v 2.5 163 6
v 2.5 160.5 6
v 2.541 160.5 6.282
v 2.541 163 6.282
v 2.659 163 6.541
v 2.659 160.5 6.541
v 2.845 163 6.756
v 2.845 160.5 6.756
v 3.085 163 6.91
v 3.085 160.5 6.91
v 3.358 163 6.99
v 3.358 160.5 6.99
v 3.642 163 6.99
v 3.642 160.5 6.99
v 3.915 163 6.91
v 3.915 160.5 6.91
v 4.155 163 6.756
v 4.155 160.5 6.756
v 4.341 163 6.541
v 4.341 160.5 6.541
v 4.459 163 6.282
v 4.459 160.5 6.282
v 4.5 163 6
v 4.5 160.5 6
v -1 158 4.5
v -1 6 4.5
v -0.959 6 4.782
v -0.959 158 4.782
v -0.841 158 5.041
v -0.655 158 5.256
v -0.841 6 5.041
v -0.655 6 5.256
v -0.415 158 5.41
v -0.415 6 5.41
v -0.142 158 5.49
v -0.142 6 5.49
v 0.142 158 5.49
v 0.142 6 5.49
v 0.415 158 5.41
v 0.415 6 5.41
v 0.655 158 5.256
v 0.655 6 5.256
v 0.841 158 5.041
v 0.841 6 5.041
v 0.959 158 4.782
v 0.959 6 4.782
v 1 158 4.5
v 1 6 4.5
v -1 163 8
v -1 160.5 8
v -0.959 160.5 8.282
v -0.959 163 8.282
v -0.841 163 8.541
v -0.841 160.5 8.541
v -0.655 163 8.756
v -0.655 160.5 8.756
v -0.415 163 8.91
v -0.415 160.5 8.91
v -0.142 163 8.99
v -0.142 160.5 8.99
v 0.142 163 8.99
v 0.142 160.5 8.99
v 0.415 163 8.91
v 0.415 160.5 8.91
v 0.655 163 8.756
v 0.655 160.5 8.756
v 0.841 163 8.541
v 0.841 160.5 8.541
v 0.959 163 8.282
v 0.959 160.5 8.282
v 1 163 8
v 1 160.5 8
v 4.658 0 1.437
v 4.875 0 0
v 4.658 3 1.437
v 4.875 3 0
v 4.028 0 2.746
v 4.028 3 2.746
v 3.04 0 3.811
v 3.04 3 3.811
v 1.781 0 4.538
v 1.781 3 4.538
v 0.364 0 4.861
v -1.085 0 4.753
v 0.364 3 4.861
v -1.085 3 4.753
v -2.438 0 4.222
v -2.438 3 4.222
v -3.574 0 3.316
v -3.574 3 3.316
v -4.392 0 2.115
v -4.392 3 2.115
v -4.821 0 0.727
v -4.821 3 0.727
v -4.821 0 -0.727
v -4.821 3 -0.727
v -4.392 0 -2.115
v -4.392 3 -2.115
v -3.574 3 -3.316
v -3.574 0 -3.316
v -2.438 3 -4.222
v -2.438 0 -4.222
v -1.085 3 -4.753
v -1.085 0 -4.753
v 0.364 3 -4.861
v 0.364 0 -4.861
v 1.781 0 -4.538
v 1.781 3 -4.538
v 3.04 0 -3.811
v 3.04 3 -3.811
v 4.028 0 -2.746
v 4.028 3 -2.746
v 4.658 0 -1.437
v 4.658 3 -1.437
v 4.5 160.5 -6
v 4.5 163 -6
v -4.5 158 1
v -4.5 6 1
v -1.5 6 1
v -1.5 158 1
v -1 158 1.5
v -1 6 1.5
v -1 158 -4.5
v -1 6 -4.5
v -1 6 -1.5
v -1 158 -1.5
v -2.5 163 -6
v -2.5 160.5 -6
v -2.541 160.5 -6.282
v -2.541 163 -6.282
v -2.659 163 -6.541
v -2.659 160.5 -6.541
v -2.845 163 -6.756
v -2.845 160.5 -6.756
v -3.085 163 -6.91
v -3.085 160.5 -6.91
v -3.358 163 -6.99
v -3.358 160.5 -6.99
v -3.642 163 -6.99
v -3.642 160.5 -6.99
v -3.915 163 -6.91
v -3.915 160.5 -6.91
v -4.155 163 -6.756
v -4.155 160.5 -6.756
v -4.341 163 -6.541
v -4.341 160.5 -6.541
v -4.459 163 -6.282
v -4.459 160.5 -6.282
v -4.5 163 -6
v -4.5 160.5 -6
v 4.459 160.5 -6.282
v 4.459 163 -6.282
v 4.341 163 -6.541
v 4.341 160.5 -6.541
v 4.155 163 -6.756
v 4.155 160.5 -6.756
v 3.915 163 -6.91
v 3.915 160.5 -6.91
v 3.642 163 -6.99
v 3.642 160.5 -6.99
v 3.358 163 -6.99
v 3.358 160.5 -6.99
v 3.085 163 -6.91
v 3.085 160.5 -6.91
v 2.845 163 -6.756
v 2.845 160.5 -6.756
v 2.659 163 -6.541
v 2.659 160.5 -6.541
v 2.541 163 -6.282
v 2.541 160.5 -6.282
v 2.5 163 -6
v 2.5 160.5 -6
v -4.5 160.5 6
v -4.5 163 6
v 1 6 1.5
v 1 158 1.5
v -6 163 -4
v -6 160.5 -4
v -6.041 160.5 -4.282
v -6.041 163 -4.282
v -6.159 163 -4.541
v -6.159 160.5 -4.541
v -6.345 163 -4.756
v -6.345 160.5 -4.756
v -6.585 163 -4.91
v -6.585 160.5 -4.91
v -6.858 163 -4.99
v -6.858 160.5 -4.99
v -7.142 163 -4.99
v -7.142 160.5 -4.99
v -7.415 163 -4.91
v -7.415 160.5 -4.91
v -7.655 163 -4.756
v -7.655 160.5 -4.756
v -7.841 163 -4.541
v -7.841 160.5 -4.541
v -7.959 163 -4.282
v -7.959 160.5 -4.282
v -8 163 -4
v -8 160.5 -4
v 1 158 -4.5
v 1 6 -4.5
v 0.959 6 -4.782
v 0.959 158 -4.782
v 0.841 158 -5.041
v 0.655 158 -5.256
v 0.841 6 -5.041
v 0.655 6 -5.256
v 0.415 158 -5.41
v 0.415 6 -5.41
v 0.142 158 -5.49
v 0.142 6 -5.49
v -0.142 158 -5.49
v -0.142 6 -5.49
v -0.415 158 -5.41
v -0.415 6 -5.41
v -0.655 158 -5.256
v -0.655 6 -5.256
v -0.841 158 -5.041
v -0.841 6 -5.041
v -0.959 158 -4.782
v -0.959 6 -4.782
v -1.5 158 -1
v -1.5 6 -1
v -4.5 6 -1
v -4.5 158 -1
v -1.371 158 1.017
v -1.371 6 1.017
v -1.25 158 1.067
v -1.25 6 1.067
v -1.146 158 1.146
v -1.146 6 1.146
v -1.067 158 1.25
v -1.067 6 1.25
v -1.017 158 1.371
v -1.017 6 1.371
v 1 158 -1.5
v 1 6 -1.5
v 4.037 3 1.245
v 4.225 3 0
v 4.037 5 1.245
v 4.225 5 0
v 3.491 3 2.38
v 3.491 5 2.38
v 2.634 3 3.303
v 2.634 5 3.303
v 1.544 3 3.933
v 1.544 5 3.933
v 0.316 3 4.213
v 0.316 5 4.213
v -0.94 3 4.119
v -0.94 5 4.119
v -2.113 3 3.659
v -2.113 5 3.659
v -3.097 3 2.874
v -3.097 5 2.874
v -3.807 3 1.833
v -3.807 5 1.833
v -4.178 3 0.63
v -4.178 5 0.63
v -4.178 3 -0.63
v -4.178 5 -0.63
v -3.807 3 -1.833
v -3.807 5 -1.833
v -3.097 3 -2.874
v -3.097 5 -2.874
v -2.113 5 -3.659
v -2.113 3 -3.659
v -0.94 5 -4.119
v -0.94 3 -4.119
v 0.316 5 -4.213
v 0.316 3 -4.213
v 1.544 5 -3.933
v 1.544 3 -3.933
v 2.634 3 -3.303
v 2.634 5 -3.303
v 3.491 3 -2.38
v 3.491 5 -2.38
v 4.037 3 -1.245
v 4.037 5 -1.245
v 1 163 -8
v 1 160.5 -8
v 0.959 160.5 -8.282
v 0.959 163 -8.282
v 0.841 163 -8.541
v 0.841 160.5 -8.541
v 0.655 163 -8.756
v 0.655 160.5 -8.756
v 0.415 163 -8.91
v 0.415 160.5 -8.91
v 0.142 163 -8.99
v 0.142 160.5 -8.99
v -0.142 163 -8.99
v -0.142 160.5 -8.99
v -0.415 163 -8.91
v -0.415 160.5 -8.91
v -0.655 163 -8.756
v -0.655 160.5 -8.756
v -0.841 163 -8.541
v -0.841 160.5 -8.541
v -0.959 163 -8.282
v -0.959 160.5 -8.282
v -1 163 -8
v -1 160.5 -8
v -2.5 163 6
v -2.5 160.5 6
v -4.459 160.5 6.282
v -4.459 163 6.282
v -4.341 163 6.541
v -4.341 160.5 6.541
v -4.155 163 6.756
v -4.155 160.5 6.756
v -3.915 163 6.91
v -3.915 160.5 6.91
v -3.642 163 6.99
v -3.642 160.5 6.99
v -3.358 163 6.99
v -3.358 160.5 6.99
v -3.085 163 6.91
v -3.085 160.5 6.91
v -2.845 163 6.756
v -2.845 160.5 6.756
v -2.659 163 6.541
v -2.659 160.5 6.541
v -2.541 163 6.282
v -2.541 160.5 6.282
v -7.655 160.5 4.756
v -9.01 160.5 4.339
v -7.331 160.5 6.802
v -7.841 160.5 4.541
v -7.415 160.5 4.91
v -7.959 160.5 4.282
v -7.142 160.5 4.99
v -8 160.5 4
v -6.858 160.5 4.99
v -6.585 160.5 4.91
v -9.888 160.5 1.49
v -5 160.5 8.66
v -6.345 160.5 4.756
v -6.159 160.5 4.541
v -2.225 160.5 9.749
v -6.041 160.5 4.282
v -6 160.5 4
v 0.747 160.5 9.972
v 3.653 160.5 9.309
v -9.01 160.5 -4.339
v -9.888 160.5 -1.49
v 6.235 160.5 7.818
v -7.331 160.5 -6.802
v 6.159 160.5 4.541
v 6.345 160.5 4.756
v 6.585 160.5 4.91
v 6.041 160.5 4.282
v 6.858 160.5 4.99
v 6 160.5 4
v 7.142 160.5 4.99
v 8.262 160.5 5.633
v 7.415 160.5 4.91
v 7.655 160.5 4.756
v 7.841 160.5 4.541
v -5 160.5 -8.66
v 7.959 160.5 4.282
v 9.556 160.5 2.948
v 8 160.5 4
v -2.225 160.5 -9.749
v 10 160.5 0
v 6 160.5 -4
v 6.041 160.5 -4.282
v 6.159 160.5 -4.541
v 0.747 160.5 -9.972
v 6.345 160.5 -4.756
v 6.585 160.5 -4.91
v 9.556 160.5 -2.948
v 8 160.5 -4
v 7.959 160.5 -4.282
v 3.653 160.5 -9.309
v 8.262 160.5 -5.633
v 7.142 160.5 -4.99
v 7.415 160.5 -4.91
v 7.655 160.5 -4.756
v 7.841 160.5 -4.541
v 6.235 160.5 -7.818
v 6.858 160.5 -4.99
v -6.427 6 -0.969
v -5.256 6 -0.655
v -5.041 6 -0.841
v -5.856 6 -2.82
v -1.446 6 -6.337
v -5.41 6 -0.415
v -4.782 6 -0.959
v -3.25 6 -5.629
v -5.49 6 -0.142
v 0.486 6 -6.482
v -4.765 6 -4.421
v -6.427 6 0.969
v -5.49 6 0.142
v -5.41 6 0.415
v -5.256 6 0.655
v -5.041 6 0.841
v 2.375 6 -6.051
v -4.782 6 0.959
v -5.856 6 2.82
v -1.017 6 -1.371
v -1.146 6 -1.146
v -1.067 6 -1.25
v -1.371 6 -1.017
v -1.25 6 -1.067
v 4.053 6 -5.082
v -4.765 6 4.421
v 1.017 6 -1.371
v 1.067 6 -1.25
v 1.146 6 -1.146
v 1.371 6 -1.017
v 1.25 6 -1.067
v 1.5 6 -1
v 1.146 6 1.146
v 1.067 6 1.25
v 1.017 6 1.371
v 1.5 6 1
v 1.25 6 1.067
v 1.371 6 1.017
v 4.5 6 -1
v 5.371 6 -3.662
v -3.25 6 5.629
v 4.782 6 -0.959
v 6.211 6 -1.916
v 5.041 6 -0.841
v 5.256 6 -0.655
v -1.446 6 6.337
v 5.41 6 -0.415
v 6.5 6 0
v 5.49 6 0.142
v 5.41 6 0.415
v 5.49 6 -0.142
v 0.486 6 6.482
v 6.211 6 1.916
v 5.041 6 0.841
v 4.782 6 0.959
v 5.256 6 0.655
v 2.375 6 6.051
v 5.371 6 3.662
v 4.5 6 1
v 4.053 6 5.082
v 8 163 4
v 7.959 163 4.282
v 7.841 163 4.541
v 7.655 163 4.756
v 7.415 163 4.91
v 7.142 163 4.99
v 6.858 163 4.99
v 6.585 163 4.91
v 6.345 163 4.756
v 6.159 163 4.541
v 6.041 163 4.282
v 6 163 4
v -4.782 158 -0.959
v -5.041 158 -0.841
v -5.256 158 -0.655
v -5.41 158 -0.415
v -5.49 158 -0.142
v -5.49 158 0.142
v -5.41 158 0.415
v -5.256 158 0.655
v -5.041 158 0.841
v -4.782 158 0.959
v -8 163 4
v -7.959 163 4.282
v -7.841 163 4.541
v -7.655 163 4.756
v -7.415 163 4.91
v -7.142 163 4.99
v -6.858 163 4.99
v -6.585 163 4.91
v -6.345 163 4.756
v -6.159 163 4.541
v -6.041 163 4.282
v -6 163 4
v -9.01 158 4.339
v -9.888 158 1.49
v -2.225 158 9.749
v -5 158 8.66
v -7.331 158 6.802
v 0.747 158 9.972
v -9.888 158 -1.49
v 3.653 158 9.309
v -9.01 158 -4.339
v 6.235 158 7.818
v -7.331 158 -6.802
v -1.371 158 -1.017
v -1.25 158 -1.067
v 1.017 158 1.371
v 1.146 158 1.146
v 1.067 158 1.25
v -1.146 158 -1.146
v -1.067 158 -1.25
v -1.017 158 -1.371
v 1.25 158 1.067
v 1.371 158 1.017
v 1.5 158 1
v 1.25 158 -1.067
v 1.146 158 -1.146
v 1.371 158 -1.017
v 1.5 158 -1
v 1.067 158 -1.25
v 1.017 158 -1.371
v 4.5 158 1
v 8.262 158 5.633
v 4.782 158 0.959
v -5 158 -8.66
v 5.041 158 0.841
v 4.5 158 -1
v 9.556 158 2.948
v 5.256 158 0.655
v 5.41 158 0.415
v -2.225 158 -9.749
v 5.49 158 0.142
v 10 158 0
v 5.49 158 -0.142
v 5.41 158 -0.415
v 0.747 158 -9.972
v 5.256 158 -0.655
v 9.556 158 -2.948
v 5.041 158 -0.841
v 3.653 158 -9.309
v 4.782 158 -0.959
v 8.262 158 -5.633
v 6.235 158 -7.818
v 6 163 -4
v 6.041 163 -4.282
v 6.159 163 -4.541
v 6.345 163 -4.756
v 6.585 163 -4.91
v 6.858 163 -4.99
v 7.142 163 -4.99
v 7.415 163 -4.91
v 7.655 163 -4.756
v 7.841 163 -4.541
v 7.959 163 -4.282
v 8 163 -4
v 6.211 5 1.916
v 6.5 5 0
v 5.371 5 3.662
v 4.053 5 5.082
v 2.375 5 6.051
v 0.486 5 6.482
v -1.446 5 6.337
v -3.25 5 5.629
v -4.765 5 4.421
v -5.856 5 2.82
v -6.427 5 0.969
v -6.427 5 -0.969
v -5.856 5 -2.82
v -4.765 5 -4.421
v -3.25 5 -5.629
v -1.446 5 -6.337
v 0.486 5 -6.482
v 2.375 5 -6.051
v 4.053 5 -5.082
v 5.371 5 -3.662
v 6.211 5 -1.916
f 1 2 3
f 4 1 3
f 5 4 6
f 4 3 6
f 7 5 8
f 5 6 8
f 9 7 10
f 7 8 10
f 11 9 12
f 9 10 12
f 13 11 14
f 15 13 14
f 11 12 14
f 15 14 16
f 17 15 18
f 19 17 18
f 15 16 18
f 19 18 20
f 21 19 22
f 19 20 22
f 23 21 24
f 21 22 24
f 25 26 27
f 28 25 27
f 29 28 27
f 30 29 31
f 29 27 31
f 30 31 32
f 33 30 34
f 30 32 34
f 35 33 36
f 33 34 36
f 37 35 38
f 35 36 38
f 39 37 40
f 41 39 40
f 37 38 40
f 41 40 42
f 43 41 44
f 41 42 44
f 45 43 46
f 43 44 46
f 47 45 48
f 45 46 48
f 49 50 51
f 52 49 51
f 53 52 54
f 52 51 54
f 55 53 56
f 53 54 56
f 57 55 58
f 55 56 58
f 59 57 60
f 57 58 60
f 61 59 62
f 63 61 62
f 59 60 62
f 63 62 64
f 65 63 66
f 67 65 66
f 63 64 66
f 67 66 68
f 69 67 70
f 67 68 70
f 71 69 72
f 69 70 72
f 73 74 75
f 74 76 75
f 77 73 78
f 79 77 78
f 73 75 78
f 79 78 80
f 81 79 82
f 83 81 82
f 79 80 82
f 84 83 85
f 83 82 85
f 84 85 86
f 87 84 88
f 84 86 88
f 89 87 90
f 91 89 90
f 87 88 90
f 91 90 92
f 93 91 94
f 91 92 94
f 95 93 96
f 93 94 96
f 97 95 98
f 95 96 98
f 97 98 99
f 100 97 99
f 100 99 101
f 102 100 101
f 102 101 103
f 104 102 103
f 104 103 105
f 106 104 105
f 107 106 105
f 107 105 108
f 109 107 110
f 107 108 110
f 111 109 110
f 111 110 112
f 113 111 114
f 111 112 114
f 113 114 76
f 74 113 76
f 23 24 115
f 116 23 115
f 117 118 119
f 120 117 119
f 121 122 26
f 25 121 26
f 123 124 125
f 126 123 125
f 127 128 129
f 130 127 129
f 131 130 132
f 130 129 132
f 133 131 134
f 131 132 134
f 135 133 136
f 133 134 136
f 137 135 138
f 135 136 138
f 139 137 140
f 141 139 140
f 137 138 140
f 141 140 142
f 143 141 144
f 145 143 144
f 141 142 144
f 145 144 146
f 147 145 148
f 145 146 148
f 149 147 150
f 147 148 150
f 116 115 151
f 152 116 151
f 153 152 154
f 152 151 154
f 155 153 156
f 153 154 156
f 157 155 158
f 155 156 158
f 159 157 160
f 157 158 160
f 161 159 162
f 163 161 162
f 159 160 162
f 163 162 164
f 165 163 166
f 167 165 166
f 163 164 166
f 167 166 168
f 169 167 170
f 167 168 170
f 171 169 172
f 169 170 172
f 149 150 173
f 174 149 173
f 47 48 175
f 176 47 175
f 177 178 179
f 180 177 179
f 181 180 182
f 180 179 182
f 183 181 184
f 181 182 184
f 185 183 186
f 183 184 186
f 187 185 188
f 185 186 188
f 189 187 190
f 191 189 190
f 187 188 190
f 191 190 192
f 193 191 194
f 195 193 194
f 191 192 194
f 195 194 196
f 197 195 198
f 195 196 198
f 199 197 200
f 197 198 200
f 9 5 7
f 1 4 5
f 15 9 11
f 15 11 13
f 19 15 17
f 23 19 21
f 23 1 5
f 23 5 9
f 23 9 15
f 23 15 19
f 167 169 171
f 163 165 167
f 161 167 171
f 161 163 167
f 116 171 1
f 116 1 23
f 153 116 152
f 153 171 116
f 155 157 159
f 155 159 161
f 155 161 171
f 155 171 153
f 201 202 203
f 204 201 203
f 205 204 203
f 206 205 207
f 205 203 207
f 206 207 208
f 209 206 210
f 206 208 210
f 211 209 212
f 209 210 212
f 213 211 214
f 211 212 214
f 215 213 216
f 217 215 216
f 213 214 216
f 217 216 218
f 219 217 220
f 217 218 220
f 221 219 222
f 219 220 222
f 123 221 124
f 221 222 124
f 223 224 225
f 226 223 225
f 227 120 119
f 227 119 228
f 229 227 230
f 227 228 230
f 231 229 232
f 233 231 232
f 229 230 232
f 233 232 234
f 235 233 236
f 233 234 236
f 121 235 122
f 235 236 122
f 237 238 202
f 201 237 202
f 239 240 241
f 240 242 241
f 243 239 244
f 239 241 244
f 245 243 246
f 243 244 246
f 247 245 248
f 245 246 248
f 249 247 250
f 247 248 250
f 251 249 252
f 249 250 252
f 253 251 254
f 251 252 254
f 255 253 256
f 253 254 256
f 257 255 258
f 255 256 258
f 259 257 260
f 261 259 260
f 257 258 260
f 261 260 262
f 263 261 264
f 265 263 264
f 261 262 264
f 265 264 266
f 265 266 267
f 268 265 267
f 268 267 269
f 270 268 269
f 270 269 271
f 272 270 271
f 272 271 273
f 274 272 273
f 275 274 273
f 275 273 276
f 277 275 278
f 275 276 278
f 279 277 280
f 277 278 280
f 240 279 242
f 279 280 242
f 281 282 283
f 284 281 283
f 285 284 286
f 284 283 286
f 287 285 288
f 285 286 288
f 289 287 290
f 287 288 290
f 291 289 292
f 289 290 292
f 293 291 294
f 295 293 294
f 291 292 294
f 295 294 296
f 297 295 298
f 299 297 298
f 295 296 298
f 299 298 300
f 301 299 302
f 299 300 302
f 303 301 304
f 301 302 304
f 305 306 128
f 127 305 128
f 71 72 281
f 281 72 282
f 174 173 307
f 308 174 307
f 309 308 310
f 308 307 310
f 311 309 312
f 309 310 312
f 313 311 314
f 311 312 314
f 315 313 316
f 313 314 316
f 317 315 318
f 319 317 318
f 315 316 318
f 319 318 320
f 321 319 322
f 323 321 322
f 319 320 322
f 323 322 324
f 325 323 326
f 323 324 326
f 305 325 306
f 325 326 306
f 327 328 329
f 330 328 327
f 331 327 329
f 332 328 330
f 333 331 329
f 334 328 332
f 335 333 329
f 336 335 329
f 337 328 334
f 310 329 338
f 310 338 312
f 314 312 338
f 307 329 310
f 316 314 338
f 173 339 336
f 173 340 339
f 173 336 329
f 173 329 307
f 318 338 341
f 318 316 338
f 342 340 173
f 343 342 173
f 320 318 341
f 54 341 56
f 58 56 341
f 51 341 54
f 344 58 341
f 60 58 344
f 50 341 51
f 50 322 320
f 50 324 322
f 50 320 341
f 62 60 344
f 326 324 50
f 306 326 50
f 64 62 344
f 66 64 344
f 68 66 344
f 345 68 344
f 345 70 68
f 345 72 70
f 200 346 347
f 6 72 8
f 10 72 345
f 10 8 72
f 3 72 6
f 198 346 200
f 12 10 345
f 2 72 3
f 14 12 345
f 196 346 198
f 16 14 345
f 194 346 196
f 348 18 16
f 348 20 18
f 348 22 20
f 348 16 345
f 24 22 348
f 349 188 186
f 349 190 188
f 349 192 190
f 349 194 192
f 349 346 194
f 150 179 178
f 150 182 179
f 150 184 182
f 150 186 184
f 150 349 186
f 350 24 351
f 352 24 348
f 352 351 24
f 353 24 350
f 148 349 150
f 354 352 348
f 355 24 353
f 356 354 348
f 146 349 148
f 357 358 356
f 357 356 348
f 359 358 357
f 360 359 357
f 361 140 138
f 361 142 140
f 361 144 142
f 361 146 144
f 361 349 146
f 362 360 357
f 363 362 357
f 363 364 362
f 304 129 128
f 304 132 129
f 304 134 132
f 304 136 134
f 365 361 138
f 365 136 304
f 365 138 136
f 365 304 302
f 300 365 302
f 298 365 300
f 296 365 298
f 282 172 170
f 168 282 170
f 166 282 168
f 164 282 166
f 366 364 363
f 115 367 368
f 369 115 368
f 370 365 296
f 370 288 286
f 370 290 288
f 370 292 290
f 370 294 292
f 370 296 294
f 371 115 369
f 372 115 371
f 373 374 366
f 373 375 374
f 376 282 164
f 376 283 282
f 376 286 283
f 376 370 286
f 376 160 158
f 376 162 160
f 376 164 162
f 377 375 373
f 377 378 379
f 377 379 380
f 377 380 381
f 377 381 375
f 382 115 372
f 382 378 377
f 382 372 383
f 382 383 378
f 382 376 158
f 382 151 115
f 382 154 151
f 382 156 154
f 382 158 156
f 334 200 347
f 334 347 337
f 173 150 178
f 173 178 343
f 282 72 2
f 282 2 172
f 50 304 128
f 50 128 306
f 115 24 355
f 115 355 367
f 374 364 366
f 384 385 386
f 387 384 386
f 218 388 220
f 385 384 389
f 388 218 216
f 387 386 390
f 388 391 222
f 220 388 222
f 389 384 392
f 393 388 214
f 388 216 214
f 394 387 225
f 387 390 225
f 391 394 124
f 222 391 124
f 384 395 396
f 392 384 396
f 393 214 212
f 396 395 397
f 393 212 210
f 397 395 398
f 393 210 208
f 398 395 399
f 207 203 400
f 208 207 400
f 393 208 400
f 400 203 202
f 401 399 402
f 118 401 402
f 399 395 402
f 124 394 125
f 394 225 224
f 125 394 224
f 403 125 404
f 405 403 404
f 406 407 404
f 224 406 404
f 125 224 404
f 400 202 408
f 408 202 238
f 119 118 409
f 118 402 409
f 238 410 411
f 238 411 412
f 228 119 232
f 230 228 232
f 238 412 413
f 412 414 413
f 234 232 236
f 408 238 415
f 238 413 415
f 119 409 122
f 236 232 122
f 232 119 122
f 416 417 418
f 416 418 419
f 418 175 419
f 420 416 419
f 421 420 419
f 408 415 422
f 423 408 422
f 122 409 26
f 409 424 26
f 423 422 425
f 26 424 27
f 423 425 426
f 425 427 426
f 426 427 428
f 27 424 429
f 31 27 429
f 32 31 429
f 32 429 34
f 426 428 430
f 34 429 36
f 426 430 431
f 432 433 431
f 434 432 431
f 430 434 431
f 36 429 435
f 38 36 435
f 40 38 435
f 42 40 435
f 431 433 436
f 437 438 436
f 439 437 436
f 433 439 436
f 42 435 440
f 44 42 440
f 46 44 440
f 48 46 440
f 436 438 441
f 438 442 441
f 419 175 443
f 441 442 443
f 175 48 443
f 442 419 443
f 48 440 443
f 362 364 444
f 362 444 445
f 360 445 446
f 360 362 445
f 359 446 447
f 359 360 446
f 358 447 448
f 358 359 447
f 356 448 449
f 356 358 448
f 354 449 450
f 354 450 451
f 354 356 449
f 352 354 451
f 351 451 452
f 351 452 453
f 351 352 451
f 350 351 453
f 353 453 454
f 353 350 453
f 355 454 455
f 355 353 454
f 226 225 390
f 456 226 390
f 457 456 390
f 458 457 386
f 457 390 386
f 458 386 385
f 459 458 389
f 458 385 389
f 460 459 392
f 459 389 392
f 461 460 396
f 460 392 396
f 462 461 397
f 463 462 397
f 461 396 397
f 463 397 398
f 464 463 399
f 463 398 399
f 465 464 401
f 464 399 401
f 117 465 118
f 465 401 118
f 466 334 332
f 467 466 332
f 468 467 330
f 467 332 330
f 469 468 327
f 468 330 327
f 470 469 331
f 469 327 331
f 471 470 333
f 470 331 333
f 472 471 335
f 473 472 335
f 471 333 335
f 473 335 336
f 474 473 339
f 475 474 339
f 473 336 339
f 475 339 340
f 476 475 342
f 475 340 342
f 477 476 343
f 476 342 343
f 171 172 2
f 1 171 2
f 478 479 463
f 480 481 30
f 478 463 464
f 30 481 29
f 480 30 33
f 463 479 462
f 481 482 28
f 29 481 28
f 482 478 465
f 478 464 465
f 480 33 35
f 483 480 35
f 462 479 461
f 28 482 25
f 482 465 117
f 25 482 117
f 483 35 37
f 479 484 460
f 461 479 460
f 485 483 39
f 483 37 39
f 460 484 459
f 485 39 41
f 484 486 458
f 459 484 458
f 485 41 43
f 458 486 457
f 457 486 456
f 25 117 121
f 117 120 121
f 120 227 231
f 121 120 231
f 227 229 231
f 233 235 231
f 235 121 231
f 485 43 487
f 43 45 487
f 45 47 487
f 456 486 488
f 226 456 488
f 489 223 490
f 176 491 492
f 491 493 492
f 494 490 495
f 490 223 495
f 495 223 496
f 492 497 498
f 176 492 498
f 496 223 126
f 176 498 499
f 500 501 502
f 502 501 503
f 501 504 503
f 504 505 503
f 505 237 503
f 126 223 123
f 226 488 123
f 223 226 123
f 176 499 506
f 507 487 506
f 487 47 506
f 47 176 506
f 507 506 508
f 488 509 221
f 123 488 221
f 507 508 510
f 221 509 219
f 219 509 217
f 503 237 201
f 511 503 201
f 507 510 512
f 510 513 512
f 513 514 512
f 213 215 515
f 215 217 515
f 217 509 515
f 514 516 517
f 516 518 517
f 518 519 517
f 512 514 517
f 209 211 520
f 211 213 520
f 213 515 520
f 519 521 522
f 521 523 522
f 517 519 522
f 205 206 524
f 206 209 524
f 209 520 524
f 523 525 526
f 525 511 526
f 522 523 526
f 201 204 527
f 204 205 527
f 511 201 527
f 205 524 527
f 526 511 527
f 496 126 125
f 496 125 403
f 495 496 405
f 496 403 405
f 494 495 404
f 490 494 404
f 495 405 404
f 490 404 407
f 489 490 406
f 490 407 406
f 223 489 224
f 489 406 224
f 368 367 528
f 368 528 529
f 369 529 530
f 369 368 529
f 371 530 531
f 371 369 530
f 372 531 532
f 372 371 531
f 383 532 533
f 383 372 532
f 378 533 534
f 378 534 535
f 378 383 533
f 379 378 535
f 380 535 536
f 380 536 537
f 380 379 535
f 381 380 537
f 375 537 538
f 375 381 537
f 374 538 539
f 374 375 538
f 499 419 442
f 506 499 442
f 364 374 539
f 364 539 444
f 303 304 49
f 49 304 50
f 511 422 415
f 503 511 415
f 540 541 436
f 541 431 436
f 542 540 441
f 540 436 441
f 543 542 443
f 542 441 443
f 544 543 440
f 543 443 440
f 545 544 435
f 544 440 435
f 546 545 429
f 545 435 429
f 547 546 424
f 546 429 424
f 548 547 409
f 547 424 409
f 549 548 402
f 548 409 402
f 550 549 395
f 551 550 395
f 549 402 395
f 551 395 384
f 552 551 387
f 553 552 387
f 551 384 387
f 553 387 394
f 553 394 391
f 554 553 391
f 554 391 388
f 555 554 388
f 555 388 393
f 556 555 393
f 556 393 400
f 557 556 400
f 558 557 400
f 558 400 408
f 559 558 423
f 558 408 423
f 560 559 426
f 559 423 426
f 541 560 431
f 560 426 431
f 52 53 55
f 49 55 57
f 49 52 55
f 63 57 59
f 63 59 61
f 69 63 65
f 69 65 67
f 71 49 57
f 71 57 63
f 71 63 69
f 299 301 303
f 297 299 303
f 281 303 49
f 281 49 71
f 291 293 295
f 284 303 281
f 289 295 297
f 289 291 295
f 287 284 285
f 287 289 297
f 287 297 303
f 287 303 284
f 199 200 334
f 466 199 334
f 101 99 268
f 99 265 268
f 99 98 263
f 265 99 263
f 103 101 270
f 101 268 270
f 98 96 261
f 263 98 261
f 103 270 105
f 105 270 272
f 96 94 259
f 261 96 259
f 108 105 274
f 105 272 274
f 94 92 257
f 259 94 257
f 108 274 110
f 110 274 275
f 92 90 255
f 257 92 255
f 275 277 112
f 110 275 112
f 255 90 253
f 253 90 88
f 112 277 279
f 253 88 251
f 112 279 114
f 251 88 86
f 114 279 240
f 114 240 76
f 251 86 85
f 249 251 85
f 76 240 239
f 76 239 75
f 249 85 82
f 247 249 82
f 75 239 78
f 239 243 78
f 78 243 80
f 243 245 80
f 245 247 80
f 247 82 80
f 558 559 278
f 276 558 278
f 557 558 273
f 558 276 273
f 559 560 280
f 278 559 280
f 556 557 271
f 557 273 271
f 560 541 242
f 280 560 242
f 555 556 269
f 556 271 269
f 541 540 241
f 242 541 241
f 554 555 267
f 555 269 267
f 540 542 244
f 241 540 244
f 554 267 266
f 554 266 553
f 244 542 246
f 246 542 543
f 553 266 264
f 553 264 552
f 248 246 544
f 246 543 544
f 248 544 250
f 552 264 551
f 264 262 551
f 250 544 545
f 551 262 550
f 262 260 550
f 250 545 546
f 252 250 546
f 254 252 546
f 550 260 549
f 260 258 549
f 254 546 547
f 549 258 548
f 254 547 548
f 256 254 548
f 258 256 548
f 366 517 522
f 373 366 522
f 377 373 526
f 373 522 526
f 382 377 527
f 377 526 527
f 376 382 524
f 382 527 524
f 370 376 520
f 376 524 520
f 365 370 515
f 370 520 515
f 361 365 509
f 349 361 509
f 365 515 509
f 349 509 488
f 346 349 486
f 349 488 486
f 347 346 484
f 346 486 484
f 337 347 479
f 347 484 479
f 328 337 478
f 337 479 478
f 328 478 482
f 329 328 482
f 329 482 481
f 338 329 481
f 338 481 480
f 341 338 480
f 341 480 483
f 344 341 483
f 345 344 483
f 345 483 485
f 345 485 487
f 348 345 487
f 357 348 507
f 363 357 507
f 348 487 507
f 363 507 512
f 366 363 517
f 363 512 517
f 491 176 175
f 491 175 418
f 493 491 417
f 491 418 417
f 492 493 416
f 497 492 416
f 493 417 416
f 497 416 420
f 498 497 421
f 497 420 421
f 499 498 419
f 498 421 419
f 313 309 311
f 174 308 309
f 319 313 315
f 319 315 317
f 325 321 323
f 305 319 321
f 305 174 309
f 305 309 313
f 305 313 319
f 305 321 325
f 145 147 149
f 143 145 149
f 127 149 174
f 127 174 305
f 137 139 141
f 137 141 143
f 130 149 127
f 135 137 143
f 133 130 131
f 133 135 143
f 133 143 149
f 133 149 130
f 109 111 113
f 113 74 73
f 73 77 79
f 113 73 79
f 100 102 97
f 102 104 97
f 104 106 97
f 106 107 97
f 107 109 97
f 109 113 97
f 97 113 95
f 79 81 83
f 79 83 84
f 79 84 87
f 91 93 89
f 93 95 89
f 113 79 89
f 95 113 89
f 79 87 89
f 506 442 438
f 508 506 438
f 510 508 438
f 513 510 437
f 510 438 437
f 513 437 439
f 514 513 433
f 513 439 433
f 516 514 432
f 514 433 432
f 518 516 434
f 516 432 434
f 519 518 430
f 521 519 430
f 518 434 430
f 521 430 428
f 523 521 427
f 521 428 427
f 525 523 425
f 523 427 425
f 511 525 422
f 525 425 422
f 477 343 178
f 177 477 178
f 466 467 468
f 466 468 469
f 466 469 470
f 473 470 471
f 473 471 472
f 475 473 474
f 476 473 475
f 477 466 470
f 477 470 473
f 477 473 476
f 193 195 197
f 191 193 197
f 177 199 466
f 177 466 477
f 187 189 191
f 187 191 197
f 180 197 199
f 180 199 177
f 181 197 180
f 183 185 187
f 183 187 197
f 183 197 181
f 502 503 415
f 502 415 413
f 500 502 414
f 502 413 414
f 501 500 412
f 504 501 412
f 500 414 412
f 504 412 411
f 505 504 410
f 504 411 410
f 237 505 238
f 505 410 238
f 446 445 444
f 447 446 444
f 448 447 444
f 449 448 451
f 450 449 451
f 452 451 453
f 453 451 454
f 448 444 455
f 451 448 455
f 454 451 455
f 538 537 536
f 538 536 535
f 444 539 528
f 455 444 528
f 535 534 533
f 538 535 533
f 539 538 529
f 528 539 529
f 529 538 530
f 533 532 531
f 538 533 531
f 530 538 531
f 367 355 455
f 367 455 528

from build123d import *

# Parameters (mm, degrees)
BOSS_EXTRUDE1_DEPTH = 152
SKETCH3_R           = 10
BOSS_EXTRUDE2_DEPTH = 2.5
BOSS_EXTRUDE3_DEPTH = 2.5


with BuildPart() as part:
    # Sketch1 → Revolve1 (revolve)
    with BuildSketch(Plane.XY):
        Polygon((0, 0), (4.875, 0), (4.875, 3), (4.225, 3), (4.225, 5), (6.5, 5), (6.5, 6), (0, 6), align=None)
    revolve(axis=Axis((0, 6, 0), (0, -1, 0)))

    # Sketch2 → Boss-Extrude1 (add)
    with BuildSketch(Plane(origin=(0, 6, 0), x_dir=(1, 0, 0), z_dir=(0, 1, 0))):
        with BuildLine():
            Line((-1, 4.5), (-1, 1.5))
            ThreePointArc((-1, 1.5), (-1.146446609, 1.146446609), (-1.5, 1))
            Line((-1.5, 1), (-4.5, 1))
            ThreePointArc((-4.5, 1), (-5.5, 0), (-4.5, -1))
            Line((-4.5, -1), (-1.5, -1))
            ThreePointArc((-1.5, -1), (-1.146446609, -1.146446609), (-1, -1.5))
            Line((-1, -1.5), (-1, -4.5))
            ThreePointArc((-1, -4.5), (0, -5.5), (1, -4.5))
            Line((1, -4.5), (1, -1.5))
            ThreePointArc((1, -1.5), (1.146446609, -1.146446609), (1.5, -1))
            Line((1.5, -1), (4.5, -1))
            ThreePointArc((4.5, -1), (5.5, 0), (4.5, 1))
            Line((4.5, 1), (1.5, 1))
            ThreePointArc((1.5, 1), (1.146446609, 1.146446609), (1, 1.5))
            Line((1, 1.5), (1, 4.5))
            ThreePointArc((1, 4.5), (0, 5.5), (-1, 4.5))
        make_face()
    extrude(amount=BOSS_EXTRUDE1_DEPTH)

    # Sketch3 → Boss-Extrude2 (add)
    with BuildSketch(Plane(origin=(0, 158, 0), x_dir=(1, 0, 0), z_dir=(0, 1, 0))):
        Circle(SKETCH3_R)
    extrude(amount=BOSS_EXTRUDE2_DEPTH)

    # Sketch4 → Boss-Extrude3 (add)
    with BuildSketch(Plane(origin=(0, 160.5, 0), x_dir=(1, 0, 0), z_dir=(0, 1, 0))):
        with BuildLine():
            ThreePointArc((1, 8), (0, 9), (-1, 8))
            Line((-1, 8), (-1, -8))
            ThreePointArc((-1, -8), (0, -9), (1, -8))
            Line((1, -8), (1, 8))
        make_face()
        with BuildLine():
            ThreePointArc((-2.5, 6), (-3.5, 7), (-4.5, 6))
            Line((-4.5, 6), (-4.5, -6))
            ThreePointArc((-4.5, -6), (-3.5, -7), (-2.5, -6))
            Line((-2.5, -6), (-2.5, 6))
        make_face()
        with BuildLine():
            ThreePointArc((4.5, 6), (3.5, 7), (2.5, 6))
            Line((2.5, 6), (2.5, -6))
            ThreePointArc((2.5, -6), (3.5, -7), (4.5, -6))
            Line((4.5, -6), (4.5, 6))
        make_face()
        with BuildLine():
            ThreePointArc((6, 4), (7, 5), (8, 4))
            Line((8, 4), (8, -4))
            ThreePointArc((8, -4), (7, -5), (6, -4))
            Line((6, -4), (6, 4))
        make_face()
        with BuildLine():
            Line((-6, -4), (-6, 4))
            ThreePointArc((-6, 4), (-7, 5), (-8, 4))
            Line((-8, 4), (-8, -4))
            ThreePointArc((-8, -4), (-7, -5), (-6, -4))
        make_face()
    extrude(amount=BOSS_EXTRUDE3_DEPTH)


solid = part.part
